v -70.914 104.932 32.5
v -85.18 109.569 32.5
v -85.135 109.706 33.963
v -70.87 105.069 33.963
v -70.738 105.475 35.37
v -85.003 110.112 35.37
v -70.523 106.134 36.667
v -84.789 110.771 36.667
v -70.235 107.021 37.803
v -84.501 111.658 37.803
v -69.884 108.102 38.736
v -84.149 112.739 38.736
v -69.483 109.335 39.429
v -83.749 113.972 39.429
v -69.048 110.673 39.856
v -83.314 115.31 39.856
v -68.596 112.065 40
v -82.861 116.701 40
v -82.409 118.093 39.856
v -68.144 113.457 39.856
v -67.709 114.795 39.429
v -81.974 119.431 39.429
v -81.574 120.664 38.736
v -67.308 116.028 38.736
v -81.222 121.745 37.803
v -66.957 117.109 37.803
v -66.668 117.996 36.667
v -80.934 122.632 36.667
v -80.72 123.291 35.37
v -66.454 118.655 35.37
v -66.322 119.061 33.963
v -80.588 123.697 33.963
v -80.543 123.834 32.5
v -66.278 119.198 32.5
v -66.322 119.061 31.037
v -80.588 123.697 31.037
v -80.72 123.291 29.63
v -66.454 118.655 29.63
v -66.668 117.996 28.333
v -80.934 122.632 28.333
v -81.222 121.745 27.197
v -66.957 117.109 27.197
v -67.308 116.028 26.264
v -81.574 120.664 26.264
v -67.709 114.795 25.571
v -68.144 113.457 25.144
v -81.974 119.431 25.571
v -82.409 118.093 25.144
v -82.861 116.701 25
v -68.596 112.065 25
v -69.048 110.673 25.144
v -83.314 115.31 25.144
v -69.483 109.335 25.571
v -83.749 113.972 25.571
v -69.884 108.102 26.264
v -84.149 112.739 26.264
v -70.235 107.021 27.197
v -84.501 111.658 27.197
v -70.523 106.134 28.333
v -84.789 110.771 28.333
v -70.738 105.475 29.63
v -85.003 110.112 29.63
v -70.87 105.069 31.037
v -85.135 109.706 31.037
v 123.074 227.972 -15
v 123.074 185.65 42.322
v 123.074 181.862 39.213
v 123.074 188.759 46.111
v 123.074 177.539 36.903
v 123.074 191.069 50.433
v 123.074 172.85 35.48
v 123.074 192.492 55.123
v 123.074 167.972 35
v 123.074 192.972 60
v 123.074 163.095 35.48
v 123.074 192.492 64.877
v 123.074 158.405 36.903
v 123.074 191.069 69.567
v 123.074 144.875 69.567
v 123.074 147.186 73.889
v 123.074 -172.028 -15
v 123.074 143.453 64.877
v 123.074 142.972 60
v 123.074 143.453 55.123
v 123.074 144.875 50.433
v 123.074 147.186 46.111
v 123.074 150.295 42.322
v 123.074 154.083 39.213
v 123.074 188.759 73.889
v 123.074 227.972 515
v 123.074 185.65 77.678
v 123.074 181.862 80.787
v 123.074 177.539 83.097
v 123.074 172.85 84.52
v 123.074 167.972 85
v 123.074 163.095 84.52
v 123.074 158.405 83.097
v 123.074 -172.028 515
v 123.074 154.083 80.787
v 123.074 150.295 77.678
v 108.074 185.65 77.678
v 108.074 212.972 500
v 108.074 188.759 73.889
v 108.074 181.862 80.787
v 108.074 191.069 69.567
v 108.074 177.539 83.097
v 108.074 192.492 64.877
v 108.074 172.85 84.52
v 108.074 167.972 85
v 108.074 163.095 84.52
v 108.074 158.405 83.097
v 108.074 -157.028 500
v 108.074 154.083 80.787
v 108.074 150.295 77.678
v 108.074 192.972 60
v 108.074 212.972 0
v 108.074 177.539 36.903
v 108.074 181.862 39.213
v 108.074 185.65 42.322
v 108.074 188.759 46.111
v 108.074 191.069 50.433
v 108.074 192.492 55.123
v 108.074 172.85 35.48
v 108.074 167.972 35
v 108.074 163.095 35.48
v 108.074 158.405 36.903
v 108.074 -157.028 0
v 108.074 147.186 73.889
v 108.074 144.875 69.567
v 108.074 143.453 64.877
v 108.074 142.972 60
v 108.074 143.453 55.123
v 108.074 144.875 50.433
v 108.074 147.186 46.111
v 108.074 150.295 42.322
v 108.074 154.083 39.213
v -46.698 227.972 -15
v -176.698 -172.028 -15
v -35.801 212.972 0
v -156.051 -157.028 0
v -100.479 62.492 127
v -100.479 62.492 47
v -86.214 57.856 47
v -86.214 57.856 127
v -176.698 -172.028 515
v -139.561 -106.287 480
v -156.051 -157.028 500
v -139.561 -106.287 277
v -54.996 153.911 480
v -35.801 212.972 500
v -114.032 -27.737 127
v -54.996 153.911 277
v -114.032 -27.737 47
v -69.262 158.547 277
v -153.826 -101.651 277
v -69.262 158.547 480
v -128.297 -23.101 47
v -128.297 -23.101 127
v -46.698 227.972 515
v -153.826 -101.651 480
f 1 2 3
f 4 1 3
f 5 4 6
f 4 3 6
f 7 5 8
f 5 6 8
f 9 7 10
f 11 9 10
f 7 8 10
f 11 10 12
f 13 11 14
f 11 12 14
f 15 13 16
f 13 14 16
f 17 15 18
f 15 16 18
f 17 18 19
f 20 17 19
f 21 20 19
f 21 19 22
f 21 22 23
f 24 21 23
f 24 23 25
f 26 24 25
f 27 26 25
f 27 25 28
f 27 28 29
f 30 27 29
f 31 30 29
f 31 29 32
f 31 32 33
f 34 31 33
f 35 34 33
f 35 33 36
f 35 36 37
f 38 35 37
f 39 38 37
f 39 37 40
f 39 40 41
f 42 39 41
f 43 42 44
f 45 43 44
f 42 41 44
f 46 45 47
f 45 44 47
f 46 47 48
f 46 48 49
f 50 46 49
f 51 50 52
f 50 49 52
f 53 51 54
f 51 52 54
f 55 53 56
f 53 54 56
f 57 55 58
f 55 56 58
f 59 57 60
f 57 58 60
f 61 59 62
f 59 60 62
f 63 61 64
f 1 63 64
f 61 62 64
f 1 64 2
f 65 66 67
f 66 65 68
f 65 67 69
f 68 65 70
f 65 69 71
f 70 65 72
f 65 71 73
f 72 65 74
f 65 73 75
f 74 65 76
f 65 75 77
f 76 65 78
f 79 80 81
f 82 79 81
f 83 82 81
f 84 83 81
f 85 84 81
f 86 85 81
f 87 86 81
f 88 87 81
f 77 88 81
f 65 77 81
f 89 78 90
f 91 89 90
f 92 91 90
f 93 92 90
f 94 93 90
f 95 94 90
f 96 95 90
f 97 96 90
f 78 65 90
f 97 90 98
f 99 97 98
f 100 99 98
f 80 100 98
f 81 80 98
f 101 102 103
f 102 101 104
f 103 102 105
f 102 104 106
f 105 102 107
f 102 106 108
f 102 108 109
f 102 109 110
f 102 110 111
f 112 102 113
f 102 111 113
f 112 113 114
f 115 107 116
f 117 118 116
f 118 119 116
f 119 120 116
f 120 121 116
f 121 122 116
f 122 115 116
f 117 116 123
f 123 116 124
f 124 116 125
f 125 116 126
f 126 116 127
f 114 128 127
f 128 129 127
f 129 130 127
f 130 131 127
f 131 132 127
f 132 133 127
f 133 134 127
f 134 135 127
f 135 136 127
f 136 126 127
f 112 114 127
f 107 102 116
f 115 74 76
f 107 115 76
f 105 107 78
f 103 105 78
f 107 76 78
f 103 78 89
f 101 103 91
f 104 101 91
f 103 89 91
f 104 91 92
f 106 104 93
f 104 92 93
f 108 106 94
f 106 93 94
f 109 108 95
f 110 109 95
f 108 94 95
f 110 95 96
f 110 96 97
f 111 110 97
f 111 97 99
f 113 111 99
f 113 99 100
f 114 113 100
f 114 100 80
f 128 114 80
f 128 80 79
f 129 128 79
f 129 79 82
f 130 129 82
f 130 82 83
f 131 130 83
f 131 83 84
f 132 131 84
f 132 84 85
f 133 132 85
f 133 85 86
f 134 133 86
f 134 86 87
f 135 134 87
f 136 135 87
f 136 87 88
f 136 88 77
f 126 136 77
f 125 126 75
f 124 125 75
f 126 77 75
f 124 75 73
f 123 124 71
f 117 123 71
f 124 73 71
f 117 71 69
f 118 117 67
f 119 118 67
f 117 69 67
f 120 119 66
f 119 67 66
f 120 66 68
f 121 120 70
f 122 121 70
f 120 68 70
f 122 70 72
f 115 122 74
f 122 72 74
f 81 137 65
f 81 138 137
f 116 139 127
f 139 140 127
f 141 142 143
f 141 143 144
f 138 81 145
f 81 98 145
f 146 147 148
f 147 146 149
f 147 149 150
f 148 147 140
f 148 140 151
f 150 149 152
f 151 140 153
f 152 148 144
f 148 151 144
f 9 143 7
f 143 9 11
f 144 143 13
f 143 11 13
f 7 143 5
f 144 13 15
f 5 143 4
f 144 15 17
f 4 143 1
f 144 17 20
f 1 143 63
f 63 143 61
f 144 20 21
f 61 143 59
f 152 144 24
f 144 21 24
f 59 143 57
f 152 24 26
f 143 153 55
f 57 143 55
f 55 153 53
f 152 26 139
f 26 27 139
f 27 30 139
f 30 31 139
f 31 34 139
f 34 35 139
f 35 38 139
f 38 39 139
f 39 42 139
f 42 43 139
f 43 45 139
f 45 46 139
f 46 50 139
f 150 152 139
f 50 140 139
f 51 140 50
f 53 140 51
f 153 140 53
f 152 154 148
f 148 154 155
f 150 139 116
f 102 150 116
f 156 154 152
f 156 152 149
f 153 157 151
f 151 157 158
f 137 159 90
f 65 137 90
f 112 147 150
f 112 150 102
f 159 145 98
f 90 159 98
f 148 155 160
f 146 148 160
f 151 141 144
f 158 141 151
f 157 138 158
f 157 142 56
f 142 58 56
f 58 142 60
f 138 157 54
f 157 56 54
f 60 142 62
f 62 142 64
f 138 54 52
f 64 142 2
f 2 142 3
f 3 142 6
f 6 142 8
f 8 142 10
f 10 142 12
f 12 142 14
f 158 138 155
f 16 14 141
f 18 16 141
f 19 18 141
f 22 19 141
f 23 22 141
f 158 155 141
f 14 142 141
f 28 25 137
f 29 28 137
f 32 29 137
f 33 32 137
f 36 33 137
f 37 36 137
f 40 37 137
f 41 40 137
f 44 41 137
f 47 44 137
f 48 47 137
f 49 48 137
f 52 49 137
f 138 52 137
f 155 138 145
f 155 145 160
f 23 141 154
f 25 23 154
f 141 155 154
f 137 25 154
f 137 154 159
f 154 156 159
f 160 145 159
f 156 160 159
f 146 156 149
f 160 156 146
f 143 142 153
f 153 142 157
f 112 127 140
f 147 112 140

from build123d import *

# Parameters (mm, degrees)
F1_DEPTH  = 500
F2_W      = 273.5948168963
F2_H      = 203
F2_W_2    = 90
F2_H_2    = 80
F3_DEPTH  = 25
F2_R      = 7.5
F4_DEPTH  = 25
F5_R      = 25
F6_DEPTH  = 25
F8_DEPTH  = 15
F10_DEPTH = 15


with BuildPart() as f1:
    # F0 (on Top) → F1 (new body)
    with BuildSketch(Plane.XY):
        Polygon((123.0739113364, 227.9723018915), (-30.9260886636, 227.9723018915), (-35.8010886636, 212.9723018915), (108.0739113364, 212.9723018915), (108.0739113364, -157.0276981085), (-156.0510886636, -157.0276981085), (-160.9260886636, -172.0276981085), (123.0739113364, -172.0276981085), align=None)
        Polygon((-30.9260886636, 227.9723018915), (-46.6983942972, 227.9723018915), (-176.6983942972, -172.0276981085), (-160.9260886636, -172.0276981085), (-156.0510886636, -157.0276981085), (-35.8010886636, 212.9723018915), align=None)
    extrude(amount=F1_DEPTH)

    # F2 (on face) → F3 (cut)
    with BuildSketch(Plane(origin=(-109.2498744257, 35.5062091884, 0), x_dir=(-0.3090860723, -0.9510340687, 0), z_dir=(-0.9510340687, 0.3090860723, 0))):
        with Locations((7.4218059001, 378.5)):
            Rectangle(F2_W, F2_H)
        with Locations((16.6243974519, 87)):
            Rectangle(F2_W_2, F2_H_2)
    extrude(amount=-F3_DEPTH, mode=Mode.SUBTRACT)

    # F2 (on face) → F4 (cut)
    with BuildSketch(Plane(origin=(-109.2498744257, 35.5062091884, 0), x_dir=(-0.3090860723, -0.9510340687, 0), z_dir=(-0.9510340687, 0.3090860723, 0))):
        with Locations((-85.3756025481, 32.5)):
            Circle(F2_R)
    extrude(amount=-F4_DEPTH, mode=Mode.SUBTRACT)

    # F5 (on face) → F6 (cut)
    with BuildSketch(Plane.YZ.offset(123.0739113364)):
        with Locations((167.9723018915, 60)):
            Circle(F5_R)
    extrude(amount=-F6_DEPTH, mode=Mode.SUBTRACT)

    # F7 (on face) → F8 (join)
    with BuildSketch(Plane.XY.offset(500)):
        Polygon((123.0739113364, -172.0276981085), (123.0739113364, 227.9723018915), (-46.6983942972, 227.9723018915), (-176.6983942972, -172.0276981085), align=None)
    extrude(amount=F8_DEPTH)

    # F9 (on face) → F10 (join)
    with BuildSketch(Plane(origin=(0, 0, 0), x_dir=(1, 0, 0), z_dir=(0, 0, -1))):
        Polygon((-46.6983942972, -227.9723018915), (123.0739113364, -227.9723018915), (123.0739113364, 172.0276981085), (-176.6983942972, 172.0276981085), align=None)
    extrude(amount=F10_DEPTH)


solid = f1.part
